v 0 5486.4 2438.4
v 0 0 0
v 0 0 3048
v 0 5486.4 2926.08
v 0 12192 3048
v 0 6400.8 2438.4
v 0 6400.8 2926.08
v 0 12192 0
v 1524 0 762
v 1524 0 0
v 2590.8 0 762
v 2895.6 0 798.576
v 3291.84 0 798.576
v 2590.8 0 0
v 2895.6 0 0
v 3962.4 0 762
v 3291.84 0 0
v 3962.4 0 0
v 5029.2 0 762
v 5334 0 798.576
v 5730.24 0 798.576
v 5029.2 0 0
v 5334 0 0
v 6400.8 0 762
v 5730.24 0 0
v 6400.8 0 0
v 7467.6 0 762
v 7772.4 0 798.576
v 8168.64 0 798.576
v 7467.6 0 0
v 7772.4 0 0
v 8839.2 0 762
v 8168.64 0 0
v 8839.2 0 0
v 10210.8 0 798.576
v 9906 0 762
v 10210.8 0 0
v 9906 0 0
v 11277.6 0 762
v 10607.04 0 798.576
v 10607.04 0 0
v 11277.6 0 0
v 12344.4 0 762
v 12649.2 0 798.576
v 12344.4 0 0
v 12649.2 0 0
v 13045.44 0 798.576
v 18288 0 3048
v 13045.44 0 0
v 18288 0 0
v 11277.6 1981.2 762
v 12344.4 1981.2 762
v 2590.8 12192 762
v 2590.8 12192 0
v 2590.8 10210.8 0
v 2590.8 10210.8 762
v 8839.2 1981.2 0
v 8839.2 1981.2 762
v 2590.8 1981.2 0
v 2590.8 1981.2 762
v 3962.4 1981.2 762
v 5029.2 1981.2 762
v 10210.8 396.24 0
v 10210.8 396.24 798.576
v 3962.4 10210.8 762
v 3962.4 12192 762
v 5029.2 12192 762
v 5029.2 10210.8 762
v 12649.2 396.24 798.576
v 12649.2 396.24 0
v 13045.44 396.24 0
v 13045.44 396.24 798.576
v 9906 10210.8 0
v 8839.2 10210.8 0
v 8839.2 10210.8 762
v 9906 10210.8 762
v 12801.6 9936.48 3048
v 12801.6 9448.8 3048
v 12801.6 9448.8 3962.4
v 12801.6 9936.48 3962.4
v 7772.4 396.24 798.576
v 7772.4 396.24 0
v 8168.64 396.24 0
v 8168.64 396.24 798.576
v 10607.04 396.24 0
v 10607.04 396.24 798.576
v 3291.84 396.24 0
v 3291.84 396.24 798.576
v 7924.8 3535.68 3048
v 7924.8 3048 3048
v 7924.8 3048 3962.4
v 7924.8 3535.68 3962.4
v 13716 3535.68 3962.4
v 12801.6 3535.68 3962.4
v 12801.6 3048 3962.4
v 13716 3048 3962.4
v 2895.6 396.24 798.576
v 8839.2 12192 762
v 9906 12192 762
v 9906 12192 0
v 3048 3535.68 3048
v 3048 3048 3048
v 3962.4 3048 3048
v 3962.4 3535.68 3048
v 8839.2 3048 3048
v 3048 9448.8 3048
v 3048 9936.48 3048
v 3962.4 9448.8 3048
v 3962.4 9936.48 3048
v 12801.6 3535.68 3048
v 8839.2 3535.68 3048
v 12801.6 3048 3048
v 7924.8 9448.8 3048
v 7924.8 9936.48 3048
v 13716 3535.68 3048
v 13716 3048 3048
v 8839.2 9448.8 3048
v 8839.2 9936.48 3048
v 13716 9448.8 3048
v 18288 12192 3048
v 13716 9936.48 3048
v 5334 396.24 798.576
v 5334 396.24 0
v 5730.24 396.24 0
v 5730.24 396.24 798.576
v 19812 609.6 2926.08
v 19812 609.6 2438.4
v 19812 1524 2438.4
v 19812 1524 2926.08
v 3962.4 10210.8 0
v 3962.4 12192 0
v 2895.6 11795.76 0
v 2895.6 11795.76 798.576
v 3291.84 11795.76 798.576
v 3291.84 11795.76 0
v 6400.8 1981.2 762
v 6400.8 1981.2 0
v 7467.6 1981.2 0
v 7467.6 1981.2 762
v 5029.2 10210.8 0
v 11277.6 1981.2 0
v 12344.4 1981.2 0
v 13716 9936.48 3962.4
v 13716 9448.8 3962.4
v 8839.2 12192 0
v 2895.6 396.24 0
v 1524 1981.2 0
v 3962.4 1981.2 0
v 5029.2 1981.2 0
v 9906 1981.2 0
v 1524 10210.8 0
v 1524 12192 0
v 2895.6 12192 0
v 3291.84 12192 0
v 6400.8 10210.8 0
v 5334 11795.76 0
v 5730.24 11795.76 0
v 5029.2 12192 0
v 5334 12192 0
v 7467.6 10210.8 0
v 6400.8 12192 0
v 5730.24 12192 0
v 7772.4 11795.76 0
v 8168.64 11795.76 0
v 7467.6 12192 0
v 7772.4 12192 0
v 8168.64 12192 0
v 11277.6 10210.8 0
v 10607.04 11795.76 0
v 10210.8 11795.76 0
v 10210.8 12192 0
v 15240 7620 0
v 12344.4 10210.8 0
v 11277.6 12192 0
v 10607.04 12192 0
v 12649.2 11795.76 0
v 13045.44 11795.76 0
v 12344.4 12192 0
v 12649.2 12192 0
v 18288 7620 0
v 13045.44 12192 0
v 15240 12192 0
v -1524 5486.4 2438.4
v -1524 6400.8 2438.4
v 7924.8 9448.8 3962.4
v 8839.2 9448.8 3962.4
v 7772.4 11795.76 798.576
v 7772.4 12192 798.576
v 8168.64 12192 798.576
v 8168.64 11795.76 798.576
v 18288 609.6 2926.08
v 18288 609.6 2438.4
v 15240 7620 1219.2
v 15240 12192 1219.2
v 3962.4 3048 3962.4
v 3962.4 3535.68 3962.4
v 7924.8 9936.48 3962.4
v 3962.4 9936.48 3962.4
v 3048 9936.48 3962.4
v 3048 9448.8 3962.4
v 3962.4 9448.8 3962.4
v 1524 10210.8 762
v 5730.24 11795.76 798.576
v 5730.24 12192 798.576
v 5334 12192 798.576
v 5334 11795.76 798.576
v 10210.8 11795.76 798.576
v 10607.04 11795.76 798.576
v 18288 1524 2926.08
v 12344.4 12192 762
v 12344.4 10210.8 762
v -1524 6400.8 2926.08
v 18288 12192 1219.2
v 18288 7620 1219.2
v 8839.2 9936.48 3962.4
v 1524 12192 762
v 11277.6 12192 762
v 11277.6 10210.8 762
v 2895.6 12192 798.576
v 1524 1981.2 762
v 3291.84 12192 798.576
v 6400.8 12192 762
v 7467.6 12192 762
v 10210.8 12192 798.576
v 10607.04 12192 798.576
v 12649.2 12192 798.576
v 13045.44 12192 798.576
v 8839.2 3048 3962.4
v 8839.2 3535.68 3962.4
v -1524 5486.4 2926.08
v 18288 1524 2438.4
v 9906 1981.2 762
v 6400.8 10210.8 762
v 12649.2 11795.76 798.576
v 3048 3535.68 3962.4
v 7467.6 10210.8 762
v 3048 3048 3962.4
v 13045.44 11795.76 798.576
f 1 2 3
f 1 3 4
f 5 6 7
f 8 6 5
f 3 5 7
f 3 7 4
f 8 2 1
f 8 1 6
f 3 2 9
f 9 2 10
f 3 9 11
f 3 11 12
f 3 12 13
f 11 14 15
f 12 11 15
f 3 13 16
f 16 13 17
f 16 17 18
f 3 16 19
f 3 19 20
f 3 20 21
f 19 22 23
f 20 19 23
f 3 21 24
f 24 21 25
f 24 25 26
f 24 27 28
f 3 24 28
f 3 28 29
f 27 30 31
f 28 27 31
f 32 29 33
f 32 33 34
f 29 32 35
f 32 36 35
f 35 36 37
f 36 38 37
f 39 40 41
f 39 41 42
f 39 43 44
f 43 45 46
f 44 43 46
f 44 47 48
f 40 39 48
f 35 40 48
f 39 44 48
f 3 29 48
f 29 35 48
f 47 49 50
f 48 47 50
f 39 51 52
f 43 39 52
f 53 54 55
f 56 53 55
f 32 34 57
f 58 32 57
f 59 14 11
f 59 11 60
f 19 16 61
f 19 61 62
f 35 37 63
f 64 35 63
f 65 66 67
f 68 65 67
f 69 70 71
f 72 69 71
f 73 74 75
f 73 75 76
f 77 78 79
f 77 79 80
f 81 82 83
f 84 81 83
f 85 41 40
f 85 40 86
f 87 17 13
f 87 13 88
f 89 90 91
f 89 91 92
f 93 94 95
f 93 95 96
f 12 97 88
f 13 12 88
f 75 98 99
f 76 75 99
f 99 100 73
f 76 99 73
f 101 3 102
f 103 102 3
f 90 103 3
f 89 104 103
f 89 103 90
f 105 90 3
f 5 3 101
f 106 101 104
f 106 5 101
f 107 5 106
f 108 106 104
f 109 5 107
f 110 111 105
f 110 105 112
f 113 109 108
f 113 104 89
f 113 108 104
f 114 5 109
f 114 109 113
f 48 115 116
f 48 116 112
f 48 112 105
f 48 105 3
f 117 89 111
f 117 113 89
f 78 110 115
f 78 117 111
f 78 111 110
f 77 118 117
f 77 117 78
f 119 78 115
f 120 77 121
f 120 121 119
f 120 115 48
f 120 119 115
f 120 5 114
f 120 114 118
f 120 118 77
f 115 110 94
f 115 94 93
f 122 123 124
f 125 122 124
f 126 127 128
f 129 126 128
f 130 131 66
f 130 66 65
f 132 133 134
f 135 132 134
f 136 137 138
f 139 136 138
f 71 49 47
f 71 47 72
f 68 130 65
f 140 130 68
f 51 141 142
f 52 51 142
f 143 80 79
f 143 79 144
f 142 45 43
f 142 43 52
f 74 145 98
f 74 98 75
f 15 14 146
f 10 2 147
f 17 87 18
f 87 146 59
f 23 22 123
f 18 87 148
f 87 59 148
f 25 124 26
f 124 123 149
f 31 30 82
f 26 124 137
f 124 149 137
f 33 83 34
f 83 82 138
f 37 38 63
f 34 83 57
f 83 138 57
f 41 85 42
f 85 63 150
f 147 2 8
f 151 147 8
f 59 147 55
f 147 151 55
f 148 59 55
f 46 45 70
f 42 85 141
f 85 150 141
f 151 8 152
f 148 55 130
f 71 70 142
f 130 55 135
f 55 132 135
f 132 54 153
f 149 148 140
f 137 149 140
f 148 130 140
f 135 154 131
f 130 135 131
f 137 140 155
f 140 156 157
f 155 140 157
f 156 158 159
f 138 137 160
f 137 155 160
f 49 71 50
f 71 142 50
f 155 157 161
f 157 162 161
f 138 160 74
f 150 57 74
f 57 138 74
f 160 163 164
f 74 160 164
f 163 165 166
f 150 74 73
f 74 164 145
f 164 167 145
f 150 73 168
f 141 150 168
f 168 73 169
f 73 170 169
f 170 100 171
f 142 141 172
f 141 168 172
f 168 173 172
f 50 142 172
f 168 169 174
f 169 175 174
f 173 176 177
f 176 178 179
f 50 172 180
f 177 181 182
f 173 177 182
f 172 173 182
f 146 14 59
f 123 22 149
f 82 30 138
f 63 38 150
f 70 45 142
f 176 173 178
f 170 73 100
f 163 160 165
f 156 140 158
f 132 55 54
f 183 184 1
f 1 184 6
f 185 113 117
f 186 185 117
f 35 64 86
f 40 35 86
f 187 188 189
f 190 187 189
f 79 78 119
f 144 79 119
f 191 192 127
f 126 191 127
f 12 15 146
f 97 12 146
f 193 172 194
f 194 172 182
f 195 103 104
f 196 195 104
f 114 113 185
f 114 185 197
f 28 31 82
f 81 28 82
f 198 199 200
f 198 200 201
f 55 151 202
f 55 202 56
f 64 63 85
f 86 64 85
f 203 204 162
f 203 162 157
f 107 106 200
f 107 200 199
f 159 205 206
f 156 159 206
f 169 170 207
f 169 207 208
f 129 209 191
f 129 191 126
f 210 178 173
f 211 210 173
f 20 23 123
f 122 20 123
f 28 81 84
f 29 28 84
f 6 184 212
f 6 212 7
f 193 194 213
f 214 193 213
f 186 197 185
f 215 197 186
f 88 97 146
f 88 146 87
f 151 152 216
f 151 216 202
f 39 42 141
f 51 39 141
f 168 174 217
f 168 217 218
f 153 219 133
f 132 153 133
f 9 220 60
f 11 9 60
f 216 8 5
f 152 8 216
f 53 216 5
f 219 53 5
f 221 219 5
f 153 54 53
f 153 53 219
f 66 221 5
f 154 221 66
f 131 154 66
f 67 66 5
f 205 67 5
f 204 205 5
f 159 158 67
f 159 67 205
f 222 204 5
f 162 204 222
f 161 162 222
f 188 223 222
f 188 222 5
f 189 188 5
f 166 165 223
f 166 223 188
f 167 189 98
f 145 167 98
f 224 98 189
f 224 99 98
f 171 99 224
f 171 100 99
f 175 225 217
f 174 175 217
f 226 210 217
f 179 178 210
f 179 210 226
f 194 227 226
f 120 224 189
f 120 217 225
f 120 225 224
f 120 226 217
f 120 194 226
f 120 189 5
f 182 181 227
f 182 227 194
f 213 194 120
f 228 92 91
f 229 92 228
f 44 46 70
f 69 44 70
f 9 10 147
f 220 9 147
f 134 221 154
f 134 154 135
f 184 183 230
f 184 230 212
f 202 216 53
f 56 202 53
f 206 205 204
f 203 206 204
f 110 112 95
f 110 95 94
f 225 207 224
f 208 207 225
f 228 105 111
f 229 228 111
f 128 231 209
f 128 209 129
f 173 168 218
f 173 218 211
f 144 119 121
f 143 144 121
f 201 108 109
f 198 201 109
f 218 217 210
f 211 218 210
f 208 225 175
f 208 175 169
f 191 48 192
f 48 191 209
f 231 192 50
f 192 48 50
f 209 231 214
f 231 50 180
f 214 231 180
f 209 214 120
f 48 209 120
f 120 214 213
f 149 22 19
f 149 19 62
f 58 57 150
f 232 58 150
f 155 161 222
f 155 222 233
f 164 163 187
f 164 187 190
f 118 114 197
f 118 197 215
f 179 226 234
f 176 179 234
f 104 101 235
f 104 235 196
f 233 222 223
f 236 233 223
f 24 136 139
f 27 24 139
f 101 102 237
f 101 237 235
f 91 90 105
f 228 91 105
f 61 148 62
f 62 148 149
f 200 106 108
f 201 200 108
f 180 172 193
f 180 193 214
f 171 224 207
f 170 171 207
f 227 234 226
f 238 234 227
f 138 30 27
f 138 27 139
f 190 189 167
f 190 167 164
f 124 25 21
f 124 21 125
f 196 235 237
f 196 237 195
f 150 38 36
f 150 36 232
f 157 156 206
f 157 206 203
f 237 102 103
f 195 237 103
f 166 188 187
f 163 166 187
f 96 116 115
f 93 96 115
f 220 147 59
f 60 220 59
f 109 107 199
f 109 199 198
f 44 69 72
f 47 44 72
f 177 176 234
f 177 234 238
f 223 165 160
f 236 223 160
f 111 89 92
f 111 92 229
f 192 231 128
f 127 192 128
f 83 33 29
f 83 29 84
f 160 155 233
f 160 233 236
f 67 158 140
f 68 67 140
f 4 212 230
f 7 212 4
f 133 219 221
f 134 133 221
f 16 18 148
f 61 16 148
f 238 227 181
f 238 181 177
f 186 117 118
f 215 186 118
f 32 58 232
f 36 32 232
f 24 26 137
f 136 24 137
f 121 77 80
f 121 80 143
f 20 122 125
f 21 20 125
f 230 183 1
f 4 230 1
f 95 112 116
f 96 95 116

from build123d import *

# Parameters (mm, degrees)
BOX011_W     = 3048
BOX011_H     = 4572
BOX011_DEPTH = 1219.2
BOX006_W     = 1066.8
BOX006_H     = 1981.2
BOX006_DEPTH = 762
BOX005_W     = 396.24
BOX005_H     = 396.24
BOX005_DEPTH = 798.576
BOX007_W     = 1066.8
BOX007_H     = 1981.2
BOX007_DEPTH = 762
BOX008_W     = 396.24
BOX008_H     = 396.24
BOX008_DEPTH = 798.576
BOX010_W     = 1066.8
BOX010_H     = 1981.2
BOX010_DEPTH = 762
BOX009_W     = 396.24
BOX009_H     = 396.24
BOX009_DEPTH = 798.576
BOX001_W     = 1066.8
BOX001_H     = 1981.2
BOX001_DEPTH = 762
BOX002_W     = 396.24
BOX002_H     = 396.24
BOX002_DEPTH = 798.576
BOX003_W     = 1066.8
BOX003_H     = 1981.2
BOX003_DEPTH = 762
BOX004_W     = 396.24
BOX004_H     = 396.24
BOX004_DEPTH = 798.576
BOX016_W     = 914.4
BOX016_H     = 487.68
BOX016_DEPTH = 1219.2
BOX018_W     = 914.4
BOX018_H     = 487.68
BOX018_DEPTH = 1219.2
BOX017_W     = 914.4
BOX017_H     = 487.68
BOX017_DEPTH = 1219.2
BOX015_W     = 914.4
BOX015_H     = 487.68
BOX015_DEPTH = 1219.2
BOX014_W     = 914.4
BOX014_H     = 487.68
BOX014_DEPTH = 1219.2
BOX019_W     = 914.4
BOX019_H     = 487.68
BOX019_DEPTH = 1219.2
BOX013_W     = 2438.4
BOX013_H     = 914.4
BOX013_DEPTH = 487.68
BOX012_W     = 2438.4
BOX012_H     = 914.4
BOX012_DEPTH = 487.68
BOX_W        = 18288
BOX_H        = 12192
BOX_DEPTH    = 3048


with BuildPart() as nurse_station:
    # Box011 → Box011 (new body)
    with BuildSketch(Plane(origin=(15240, 7620, 0), x_dir=(1, 0, 0), z_dir=(0, 0, 1))):
        with Locations((1524, 2286)):
            Rectangle(BOX011_W, BOX011_H)
    extrude(amount=BOX011_DEPTH)


with BuildPart() as box006:
    # Box006 → Box006 (new body)
    with BuildSketch(Plane.XY):
        with Locations((533.4, 990.6)):
            Rectangle(BOX006_W, BOX006_H)
    extrude(amount=BOX006_DEPTH)


with BuildPart() as fusion002:
    # Box005 → Box005 (new body)
    with BuildSketch(Plane(origin=(1371.6, 0, 0), x_dir=(1, 0, 0), z_dir=(0, 0, 1))):
        with Locations((198.12, 198.12)):
            Rectangle(BOX005_W, BOX005_H)
    extrude(amount=BOX005_DEPTH)

    # Fusion002: union Box006
    add(box006.part)


with BuildPart() as fusion002_1:
    # Fusion002 placement: moved
    add(fusion002.part.moved(Location((4876.8, 0, 0))))


with BuildPart() as box007:
    # Box007 → Box007 (new body)
    with BuildSketch(Plane.XY):
        with Locations((533.4, 990.6)):
            Rectangle(BOX007_W, BOX007_H)
    extrude(amount=BOX007_DEPTH)


with BuildPart() as fusion003:
    # Box008 → Box008 (new body)
    with BuildSketch(Plane(origin=(1371.6, 0, 0), x_dir=(1, 0, 0), z_dir=(0, 0, 1))):
        with Locations((198.12, 198.12)):
            Rectangle(BOX008_W, BOX008_H)
    extrude(amount=BOX008_DEPTH)

    # Fusion003: union Box007
    add(box007.part)


with BuildPart() as fusion003_1:
    # Fusion003 placement: moved
    add(fusion003.part.moved(Location((7315.2, 0, 0))))


with BuildPart() as box010:
    # Box010 → Box010 (new body)
    with BuildSketch(Plane.XY):
        with Locations((533.4, 990.6)):
            Rectangle(BOX010_W, BOX010_H)
    extrude(amount=BOX010_DEPTH)


with BuildPart() as fusion004:
    # Box009 → Box009 (new body)
    with BuildSketch(Plane(origin=(1371.6, 0, 0), x_dir=(1, 0, 0), z_dir=(0, 0, 1))):
        with Locations((198.12, 198.12)):
            Rectangle(BOX009_W, BOX009_H)
    extrude(amount=BOX009_DEPTH)

    # Fusion004: union Box010
    add(box010.part)


with BuildPart() as fusion004_1:
    # Fusion004 placement: moved
    add(fusion004.part.moved(Location((9753.6, 0, 0))))


with BuildPart() as box001:
    # Box001 → Box001 (new body)
    with BuildSketch(Plane.XY):
        with Locations((533.4, 990.6)):
            Rectangle(BOX001_W, BOX001_H)
    extrude(amount=BOX001_DEPTH)


with BuildPart() as fusion:
    # Box002 → Box002 (new body)
    with BuildSketch(Plane(origin=(1371.6, 0, 0), x_dir=(1, 0, 0), z_dir=(0, 0, 1))):
        with Locations((198.12, 198.12)):
            Rectangle(BOX002_W, BOX002_H)
    extrude(amount=BOX002_DEPTH)

    # Fusion: union Box001
    add(box001.part)


with BuildPart() as box003:
    # Box003 → Box003 (new body)
    with BuildSketch(Plane.XY):
        with Locations((533.4, 990.6)):
            Rectangle(BOX003_W, BOX003_H)
    extrude(amount=BOX003_DEPTH)


with BuildPart() as right_beds:
    # Box004 → Box004 (new body)
    with BuildSketch(Plane(origin=(1371.6, 0, 0), x_dir=(1, 0, 0), z_dir=(0, 0, 1))):
        with Locations((198.12, 198.12)):
            Rectangle(BOX004_W, BOX004_H)
    extrude(amount=BOX004_DEPTH)

    # Fusion001: union Box003
    add(box003.part)


with BuildPart() as right_beds_1:
    # Fusion001 placement: moved
    add(right_beds.part.moved(Location((2438.4, 0, 0))))

    # Fusion005: union Fusion002, Fusion003, Fusion004, Fusion
    add(fusion002_1.part)
    add(fusion003_1.part)
    add(fusion004_1.part)
    add(fusion.part)


with BuildPart() as all_surfaces:
    # Part__Mirroring: instance of right beds
    add(right_beds_1.part.mirror(Plane(origin=(0, 6096, 0), x_dir=(1, 0, 0), z_dir=(0, 1, 0))))

    # Fusion006: union right beds
    add(right_beds_1.part)


with BuildPart() as all_surfaces_1:
    # Fusion006 placement: moved
    add(all_surfaces.part.moved(Location((1524, 0, 0))))

    # Fusion011: union Nurse Station
    add(nurse_station.part)


with BuildPart() as branch002:
    # Box016 → Box016 (new body)
    with BuildSketch(Plane(origin=(7924.8, 3048, 2743.2), x_dir=(1, 0, 0), z_dir=(0, 0, 1))):
        with Locations((457.2, 243.84)):
            Rectangle(BOX016_W, BOX016_H)
    extrude(amount=BOX016_DEPTH)


with BuildPart() as branch004:
    # Box018 → Box018 (new body)
    with BuildSketch(Plane(origin=(3048, 3048, 2743.2), x_dir=(1, 0, 0), z_dir=(0, 0, 1))):
        with Locations((457.2, 243.84)):
            Rectangle(BOX018_W, BOX018_H)
    extrude(amount=BOX018_DEPTH)


with BuildPart() as branch003:
    # Box017 → Box017 (new body)
    with BuildSketch(Plane(origin=(7924.8, 9448.8, 2743.2), x_dir=(1, 0, 0), z_dir=(0, 0, 1))):
        with Locations((457.2, 243.84)):
            Rectangle(BOX017_W, BOX017_H)
    extrude(amount=BOX017_DEPTH)


with BuildPart() as branch001:
    # Box015 → Box015 (new body)
    with BuildSketch(Plane(origin=(12801.6, 3048, 2743.2), x_dir=(1, 0, 0), z_dir=(0, 0, 1))):
        with Locations((457.2, 243.84)):
            Rectangle(BOX015_W, BOX015_H)
    extrude(amount=BOX015_DEPTH)


with BuildPart() as branch:
    # Box014 → Box014 (new body)
    with BuildSketch(Plane(origin=(12801.6, 9448.8, 2743.2), x_dir=(1, 0, 0), z_dir=(0, 0, 1))):
        with Locations((457.2, 243.84)):
            Rectangle(BOX014_W, BOX014_H)
    extrude(amount=BOX014_DEPTH)


with BuildPart() as branch_ducts:
    # Box019 → Box019 (new body)
    with BuildSketch(Plane(origin=(3048, 9448.8, 2743.2), x_dir=(1, 0, 0), z_dir=(0, 0, 1))):
        with Locations((457.2, 243.84)):
            Rectangle(BOX019_W, BOX019_H)
    extrude(amount=BOX019_DEPTH)

    # Fusion007: union branch002, branch004, branch003, branch001, branch
    add(branch002.part)
    add(branch004.part)
    add(branch003.part)
    add(branch001.part)
    add(branch.part)


with BuildPart() as main_outlet:
    # Box013 → Box013 (new body)
    with BuildSketch(Plane(origin=(-1524, 5486.4, 2438.4), x_dir=(1, 0, 0), z_dir=(0, 0, 1))):
        with Locations((1219.2, 457.2)):
            Rectangle(BOX013_W, BOX013_H)
    extrude(amount=BOX013_DEPTH)


with BuildPart() as all_ducts:
    # Box012 → Box012 (new body)
    with BuildSketch(Plane(origin=(17373.6, 609.6, 2438.4), x_dir=(1, 0, 0), z_dir=(0, 0, 1))):
        with Locations((1219.2, 457.2)):
            Rectangle(BOX012_W, BOX012_H)
    extrude(amount=BOX012_DEPTH)

    # Fusion008: union main outlet
    add(main_outlet.part)

    # Fusion009: union branch ducts
    add(branch_ducts.part)


with BuildPart() as flow_field:
    # Box → Box (new body)
    with BuildSketch(Plane.XY):
        with Locations((9144, 6096)):
            Rectangle(BOX_W, BOX_H)
    extrude(amount=BOX_DEPTH)

    # Fusion010: union all ducts
    add(all_ducts.part)

    # Cut: cut All_Surfaces
    add(all_surfaces_1.part, mode=Mode.SUBTRACT)


solid = flow_field.part
